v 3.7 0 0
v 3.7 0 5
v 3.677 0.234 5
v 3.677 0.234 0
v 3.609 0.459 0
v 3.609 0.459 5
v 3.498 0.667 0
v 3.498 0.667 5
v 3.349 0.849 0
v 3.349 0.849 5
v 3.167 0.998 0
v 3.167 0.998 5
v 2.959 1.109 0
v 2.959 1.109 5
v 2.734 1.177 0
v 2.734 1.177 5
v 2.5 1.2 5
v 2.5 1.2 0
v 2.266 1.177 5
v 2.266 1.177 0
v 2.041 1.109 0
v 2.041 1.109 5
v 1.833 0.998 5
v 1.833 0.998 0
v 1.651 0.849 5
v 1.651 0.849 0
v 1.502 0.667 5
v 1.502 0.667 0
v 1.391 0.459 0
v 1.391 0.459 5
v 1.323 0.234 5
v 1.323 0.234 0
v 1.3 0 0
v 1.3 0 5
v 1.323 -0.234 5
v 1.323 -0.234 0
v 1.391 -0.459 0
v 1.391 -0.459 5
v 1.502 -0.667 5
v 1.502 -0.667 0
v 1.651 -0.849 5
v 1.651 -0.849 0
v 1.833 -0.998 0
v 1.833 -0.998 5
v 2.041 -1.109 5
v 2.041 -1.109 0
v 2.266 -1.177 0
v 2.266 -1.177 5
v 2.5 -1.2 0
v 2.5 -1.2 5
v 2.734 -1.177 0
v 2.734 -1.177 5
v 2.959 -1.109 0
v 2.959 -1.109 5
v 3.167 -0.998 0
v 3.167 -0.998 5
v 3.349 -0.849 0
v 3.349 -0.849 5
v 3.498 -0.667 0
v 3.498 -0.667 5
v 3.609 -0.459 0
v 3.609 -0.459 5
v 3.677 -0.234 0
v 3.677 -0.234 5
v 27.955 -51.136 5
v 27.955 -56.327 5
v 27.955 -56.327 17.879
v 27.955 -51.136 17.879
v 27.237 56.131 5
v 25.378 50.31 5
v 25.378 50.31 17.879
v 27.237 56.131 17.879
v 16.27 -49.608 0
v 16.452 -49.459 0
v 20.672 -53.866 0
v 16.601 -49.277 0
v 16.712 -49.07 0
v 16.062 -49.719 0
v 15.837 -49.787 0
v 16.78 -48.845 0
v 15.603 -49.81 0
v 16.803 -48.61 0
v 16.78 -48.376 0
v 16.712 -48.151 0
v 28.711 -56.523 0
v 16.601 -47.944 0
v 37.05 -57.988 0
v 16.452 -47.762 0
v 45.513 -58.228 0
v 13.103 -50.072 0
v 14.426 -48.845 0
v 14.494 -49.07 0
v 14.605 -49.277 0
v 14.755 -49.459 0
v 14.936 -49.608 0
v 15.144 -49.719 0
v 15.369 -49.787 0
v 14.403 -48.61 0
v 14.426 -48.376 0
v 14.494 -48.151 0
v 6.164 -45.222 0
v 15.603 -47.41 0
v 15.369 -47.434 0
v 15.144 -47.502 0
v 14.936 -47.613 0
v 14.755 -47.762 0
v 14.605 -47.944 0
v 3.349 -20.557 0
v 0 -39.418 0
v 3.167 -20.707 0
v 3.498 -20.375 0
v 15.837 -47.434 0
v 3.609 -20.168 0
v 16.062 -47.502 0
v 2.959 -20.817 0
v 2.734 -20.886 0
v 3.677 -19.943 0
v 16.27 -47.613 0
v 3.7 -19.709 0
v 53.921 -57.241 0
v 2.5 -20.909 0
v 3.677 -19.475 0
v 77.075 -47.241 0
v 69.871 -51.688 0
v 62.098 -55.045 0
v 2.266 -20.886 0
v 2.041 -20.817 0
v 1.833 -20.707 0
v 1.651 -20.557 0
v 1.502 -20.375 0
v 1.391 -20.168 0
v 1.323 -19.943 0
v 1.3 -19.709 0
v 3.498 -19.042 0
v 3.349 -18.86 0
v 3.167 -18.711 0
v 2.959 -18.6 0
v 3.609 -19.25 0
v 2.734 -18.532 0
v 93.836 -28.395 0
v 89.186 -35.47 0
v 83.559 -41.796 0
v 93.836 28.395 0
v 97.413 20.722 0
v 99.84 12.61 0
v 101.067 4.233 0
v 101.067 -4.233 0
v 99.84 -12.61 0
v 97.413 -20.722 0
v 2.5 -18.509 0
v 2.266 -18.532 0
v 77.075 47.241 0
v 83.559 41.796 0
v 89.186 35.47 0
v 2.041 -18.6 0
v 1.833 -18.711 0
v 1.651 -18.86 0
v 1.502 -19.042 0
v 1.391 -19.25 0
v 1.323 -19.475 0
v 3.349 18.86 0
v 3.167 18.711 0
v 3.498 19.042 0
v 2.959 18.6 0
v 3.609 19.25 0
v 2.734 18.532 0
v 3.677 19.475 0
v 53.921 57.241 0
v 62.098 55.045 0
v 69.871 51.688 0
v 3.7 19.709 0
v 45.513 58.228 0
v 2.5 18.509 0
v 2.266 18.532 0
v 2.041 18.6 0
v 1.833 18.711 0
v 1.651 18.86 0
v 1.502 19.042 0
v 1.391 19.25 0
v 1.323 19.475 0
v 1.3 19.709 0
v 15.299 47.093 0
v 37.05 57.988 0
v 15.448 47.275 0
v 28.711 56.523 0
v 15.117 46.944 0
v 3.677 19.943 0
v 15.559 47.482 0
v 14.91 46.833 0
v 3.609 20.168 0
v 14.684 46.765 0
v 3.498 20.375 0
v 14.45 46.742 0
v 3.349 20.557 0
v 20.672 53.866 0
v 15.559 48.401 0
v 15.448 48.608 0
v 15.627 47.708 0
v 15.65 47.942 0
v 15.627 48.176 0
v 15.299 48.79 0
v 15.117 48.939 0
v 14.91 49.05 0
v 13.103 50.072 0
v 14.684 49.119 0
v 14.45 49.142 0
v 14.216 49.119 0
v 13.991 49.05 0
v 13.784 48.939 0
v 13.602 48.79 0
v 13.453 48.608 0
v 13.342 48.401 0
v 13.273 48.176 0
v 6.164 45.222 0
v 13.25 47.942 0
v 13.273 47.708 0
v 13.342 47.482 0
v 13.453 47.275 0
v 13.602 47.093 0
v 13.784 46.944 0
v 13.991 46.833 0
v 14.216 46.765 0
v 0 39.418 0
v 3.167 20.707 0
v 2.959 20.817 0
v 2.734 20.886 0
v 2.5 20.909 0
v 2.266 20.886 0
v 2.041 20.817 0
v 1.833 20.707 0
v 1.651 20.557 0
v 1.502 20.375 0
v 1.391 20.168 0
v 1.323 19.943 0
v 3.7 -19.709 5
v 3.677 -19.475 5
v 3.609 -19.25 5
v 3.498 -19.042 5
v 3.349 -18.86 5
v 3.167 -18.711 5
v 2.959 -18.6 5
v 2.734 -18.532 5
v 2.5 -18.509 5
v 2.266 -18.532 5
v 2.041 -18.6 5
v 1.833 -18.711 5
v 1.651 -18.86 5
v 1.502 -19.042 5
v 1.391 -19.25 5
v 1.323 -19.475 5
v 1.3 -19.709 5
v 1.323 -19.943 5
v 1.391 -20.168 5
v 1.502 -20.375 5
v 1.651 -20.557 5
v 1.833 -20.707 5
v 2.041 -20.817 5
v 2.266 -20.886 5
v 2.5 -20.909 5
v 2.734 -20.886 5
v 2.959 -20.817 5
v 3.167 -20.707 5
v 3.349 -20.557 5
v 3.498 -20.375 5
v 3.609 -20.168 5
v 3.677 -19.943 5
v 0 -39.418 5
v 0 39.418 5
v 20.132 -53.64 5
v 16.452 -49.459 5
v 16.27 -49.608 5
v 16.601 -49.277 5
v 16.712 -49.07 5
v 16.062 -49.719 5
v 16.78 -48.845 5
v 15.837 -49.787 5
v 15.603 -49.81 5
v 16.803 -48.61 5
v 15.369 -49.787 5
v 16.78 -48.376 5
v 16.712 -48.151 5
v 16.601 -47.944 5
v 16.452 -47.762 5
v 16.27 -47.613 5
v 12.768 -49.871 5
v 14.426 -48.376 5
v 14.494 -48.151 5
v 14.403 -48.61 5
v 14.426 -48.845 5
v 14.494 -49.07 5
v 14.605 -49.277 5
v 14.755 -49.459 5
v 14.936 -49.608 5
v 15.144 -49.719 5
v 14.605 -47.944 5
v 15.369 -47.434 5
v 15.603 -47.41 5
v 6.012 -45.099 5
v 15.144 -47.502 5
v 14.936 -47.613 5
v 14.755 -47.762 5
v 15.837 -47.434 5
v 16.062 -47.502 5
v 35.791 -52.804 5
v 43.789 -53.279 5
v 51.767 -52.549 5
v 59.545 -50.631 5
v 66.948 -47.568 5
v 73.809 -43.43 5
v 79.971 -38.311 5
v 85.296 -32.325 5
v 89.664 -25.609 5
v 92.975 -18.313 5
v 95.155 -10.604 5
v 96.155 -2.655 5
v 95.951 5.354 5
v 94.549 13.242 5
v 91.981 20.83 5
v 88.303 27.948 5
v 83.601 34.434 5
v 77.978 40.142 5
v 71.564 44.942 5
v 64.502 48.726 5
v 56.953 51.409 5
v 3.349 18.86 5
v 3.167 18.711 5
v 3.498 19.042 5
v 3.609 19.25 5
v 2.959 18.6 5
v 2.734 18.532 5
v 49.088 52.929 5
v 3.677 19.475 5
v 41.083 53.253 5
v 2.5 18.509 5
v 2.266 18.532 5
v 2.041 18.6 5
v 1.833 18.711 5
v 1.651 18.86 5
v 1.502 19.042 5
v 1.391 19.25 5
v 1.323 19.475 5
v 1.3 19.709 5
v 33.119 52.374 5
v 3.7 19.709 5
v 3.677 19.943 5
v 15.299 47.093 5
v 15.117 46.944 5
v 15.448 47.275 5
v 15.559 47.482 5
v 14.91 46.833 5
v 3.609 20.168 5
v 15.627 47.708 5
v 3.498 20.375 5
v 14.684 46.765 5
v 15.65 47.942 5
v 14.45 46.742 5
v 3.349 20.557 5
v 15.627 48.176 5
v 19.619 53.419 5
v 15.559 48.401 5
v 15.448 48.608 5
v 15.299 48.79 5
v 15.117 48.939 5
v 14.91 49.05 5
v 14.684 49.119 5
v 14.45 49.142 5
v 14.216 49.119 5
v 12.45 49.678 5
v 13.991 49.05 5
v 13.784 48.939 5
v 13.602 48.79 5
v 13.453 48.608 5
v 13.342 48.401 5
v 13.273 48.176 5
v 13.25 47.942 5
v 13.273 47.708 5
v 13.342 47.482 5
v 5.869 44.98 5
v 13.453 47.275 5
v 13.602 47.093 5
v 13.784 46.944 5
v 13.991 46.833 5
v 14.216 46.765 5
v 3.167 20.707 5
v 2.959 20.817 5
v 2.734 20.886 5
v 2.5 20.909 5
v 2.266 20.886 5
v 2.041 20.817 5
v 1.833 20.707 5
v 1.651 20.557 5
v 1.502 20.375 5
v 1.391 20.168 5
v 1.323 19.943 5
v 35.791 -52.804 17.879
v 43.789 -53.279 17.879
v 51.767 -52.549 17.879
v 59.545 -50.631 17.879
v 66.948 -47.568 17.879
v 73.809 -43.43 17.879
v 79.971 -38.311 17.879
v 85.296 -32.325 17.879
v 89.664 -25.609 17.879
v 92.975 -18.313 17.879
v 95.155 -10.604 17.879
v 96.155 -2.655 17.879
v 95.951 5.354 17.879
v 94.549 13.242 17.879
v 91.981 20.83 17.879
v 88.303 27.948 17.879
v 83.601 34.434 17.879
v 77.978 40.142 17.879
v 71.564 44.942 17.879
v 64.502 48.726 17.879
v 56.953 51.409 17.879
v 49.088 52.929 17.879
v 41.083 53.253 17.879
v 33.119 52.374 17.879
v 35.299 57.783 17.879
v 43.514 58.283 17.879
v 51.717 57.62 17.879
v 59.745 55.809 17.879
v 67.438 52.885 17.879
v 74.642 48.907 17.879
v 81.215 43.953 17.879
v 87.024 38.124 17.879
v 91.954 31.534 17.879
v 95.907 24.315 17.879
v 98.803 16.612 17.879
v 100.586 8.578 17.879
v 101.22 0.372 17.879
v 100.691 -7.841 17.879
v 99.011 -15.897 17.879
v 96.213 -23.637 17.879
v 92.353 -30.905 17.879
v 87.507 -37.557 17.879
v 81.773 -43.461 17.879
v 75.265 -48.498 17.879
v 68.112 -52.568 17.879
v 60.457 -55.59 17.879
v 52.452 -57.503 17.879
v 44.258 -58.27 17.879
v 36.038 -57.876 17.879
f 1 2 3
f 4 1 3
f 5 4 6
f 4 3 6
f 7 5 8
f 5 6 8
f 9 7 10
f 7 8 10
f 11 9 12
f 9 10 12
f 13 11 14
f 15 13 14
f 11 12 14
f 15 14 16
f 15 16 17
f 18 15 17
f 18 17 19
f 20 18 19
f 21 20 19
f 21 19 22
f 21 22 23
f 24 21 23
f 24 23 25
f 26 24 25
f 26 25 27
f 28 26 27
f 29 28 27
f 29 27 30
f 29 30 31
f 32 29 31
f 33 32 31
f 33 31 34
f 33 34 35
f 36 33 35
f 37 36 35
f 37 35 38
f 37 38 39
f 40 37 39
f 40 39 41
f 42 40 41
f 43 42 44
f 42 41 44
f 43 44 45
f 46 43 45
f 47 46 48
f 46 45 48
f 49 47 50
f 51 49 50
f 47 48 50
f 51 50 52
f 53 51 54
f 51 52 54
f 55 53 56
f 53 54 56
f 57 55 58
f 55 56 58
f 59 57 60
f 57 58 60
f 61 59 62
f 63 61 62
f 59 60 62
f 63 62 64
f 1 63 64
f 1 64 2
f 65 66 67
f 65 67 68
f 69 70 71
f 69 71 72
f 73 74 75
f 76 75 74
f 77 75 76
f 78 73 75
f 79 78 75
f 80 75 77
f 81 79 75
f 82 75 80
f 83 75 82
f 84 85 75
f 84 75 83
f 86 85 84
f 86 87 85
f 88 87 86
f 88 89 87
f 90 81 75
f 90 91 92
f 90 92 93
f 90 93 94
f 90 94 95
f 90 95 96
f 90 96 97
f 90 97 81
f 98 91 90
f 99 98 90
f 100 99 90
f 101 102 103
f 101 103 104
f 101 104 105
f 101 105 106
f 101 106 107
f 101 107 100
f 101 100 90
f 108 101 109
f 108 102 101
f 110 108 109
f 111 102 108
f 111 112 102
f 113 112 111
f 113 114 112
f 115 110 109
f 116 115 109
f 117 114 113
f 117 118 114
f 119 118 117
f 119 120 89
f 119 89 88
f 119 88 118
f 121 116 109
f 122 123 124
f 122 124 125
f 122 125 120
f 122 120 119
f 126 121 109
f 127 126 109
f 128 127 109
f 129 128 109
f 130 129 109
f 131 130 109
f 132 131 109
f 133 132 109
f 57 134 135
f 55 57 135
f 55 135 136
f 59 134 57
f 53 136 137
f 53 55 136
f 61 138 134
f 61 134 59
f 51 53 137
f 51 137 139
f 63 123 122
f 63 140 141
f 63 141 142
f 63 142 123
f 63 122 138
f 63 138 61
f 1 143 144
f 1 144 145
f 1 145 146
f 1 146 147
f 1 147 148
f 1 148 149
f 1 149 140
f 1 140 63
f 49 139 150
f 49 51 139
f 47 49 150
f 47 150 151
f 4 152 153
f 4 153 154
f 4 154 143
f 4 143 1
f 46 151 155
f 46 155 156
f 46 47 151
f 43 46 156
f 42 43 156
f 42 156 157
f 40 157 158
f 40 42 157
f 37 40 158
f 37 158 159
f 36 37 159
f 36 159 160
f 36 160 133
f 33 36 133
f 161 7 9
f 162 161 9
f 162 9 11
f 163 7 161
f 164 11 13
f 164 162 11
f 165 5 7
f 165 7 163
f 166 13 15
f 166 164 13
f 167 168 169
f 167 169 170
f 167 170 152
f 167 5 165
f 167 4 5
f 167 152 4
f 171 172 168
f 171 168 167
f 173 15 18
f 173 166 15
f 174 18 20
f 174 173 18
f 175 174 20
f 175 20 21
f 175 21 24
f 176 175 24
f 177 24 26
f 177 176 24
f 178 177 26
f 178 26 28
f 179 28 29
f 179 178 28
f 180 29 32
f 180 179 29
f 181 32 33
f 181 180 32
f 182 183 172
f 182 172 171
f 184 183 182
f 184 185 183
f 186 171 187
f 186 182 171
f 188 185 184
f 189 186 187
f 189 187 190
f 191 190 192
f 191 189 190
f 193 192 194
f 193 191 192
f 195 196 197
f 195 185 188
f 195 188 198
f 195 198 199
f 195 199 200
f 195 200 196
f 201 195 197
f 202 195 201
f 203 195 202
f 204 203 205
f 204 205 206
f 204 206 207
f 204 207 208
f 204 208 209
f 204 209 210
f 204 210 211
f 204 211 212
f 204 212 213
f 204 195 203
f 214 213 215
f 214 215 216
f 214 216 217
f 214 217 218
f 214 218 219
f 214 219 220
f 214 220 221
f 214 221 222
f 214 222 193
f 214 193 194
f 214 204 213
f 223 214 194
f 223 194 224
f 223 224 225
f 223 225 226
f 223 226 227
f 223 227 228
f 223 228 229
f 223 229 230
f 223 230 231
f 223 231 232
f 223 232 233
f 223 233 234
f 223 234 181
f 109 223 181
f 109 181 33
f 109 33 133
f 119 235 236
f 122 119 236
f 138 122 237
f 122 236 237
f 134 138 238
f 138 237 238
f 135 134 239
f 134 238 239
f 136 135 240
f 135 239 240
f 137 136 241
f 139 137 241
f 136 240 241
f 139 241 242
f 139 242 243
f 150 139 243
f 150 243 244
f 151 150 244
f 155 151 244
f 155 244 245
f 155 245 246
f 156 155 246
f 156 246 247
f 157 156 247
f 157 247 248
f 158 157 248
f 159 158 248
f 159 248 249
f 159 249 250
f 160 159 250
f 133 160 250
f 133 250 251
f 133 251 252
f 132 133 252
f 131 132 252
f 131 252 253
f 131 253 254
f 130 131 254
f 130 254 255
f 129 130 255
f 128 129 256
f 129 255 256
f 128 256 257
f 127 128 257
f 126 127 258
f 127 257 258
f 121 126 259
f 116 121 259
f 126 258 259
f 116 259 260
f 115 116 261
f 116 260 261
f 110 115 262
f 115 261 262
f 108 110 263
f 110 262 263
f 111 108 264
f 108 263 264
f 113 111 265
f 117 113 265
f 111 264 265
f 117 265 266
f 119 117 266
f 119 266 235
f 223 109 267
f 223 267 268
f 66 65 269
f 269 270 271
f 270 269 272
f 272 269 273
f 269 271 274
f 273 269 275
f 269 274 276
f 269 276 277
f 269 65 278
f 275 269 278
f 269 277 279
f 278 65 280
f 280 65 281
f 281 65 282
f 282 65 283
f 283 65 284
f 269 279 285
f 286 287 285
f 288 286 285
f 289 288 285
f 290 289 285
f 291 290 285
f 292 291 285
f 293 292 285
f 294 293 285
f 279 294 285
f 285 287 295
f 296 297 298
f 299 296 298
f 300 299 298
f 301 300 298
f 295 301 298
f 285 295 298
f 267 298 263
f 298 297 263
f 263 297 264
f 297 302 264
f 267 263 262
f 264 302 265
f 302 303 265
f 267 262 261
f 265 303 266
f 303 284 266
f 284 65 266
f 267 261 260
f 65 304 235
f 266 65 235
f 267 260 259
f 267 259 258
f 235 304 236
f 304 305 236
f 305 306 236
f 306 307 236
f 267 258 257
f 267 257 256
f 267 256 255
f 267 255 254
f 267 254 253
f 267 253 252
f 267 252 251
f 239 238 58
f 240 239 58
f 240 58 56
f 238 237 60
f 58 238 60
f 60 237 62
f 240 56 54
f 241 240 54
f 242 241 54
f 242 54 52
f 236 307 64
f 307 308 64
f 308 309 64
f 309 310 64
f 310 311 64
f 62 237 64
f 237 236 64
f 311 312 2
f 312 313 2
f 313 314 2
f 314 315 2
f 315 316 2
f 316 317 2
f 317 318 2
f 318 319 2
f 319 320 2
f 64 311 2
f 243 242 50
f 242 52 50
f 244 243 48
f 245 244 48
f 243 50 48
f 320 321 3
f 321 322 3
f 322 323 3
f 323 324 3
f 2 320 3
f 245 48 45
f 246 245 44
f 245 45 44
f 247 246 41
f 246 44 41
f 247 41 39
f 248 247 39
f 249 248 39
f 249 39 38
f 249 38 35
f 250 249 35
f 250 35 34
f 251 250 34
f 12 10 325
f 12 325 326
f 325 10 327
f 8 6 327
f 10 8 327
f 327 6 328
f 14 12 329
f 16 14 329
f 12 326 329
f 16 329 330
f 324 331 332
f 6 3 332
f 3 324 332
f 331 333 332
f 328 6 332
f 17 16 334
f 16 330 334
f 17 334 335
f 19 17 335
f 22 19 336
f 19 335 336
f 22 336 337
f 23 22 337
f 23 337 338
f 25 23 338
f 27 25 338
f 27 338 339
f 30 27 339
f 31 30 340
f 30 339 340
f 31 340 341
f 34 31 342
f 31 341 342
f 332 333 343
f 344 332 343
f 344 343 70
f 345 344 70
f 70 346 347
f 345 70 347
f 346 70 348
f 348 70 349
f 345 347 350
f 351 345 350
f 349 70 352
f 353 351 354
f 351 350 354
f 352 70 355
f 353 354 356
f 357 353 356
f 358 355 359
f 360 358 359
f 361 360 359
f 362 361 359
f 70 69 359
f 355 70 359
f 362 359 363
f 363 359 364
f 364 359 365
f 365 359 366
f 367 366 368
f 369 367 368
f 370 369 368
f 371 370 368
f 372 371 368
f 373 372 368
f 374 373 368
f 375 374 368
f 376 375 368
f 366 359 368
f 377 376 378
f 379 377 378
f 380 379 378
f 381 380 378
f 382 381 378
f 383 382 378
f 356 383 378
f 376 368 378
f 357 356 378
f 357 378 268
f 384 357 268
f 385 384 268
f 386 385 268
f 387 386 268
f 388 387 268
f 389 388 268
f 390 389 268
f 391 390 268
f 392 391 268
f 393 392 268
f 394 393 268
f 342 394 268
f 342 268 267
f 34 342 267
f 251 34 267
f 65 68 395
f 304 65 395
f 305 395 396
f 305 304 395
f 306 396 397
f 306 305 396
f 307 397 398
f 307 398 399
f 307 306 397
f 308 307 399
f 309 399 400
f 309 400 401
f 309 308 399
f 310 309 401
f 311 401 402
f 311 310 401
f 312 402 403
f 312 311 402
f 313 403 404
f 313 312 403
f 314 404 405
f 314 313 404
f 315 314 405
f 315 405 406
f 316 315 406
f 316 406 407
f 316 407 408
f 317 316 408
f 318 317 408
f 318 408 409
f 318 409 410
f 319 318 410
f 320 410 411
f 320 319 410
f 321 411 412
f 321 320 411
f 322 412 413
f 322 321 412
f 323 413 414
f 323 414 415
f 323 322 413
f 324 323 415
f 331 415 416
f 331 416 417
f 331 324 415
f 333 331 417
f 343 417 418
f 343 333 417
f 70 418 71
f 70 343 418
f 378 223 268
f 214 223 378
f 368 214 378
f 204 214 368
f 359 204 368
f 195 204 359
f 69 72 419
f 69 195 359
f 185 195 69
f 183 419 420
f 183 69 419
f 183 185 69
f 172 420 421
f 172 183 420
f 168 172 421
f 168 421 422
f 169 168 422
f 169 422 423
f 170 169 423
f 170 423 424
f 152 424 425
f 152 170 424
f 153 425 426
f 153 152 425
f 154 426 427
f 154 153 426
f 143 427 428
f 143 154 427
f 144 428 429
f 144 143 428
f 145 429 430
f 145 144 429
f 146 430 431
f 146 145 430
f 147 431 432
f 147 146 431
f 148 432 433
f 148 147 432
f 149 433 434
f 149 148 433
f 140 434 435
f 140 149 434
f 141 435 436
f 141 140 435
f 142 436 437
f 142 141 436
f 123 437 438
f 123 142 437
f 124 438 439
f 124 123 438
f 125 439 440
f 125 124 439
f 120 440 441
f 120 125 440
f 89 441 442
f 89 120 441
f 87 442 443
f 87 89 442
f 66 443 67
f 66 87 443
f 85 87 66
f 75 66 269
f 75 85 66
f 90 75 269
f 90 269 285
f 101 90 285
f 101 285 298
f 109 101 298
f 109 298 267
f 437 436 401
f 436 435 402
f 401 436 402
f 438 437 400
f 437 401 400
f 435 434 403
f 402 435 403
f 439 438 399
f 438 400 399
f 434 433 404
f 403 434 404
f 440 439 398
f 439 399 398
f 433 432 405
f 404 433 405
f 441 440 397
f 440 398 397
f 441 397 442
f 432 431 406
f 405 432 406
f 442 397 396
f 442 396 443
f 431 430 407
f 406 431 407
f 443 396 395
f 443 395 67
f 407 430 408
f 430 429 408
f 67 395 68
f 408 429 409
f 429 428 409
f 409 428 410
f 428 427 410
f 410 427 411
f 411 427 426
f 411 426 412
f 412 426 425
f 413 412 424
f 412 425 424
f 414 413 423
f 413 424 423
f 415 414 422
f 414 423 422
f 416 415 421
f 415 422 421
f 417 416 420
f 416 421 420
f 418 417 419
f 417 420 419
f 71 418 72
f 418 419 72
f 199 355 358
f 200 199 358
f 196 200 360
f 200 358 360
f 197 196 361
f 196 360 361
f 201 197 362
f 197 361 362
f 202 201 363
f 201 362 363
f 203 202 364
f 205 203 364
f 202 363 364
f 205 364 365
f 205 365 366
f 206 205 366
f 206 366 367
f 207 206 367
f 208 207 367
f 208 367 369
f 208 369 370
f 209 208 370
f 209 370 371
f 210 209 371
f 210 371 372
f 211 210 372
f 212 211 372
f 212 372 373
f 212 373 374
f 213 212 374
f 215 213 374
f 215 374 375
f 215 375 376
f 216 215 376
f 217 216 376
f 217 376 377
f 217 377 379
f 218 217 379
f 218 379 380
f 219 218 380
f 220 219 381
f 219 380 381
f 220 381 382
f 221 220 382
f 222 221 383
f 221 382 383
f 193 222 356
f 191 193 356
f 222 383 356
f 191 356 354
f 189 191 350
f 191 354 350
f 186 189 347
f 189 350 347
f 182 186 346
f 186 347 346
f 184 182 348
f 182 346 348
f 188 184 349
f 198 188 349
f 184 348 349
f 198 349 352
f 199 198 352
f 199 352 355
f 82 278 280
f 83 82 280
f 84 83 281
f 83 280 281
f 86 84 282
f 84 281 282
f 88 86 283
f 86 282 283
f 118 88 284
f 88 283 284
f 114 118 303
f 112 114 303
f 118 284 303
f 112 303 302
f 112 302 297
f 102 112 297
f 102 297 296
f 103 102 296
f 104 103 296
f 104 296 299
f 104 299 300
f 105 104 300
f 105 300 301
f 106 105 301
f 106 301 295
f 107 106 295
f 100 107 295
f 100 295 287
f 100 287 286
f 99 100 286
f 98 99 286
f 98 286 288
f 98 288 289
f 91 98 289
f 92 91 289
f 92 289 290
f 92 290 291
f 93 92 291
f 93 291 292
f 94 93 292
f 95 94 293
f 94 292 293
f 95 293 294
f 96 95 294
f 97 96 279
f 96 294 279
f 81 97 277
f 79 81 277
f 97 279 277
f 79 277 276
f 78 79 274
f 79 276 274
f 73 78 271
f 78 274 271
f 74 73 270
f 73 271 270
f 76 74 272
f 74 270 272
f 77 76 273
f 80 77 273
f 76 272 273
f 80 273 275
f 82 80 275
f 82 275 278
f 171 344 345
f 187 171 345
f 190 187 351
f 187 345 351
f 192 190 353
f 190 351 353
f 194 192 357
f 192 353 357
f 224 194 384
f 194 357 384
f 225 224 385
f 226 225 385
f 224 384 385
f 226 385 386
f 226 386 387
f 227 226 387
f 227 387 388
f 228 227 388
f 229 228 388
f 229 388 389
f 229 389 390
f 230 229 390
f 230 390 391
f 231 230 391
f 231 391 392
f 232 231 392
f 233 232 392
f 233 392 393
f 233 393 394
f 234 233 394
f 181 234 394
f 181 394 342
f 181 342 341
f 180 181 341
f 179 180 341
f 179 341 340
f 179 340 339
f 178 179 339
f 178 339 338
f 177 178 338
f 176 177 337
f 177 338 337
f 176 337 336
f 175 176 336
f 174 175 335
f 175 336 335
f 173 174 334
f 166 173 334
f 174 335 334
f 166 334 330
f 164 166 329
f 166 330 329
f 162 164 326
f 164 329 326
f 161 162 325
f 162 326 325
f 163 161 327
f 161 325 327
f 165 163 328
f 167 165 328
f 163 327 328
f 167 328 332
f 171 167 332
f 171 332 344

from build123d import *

# Parameters (mm, degrees)
BOSS_EXTRUDE1_DEPTH = 5
SKETCH2_R           = 1.2
CUT_EXTRUDE1_DEPTH  = 117.909745524
BOSS_EXTRUDE2_DEPTH = 12.879


with BuildPart() as part:
    # Sketch1 → Boss-Extrude1 (new body)
    with BuildSketch(Plane.XY):
        with BuildLine():
            Line((0, -39.4175), (0, 39.4175))
            ThreePointArc((0, 39.4175), (101.221, 0), (0, -39.4175))
        make_face()
    extrude(amount=BOSS_EXTRUDE1_DEPTH)

    # Sketch2 → Cut-Extrude1 (cut, through all)
    with BuildSketch(Plane.XY.offset(5)):
        with Locations((2.5, 19.70875)):
            Circle(SKETCH2_R)
        with Locations((2.5, 0)):
            Circle(SKETCH2_R)
        with Locations((2.5, -19.70875)):
            Circle(SKETCH2_R)
        with Locations((14.450382973, 47.941684776)):
            Circle(SKETCH2_R)
        with Locations((15.603067001, -48.610455862)):
            Circle(SKETCH2_R)
    extrude(amount=-CUT_EXTRUDE1_DEPTH, mode=Mode.SUBTRACT)

    # Sketch3 → Boss-Extrude2 (add)
    with BuildSketch(Plane.XY.offset(5)):
        with BuildLine():
            Line((27.955, -56.327452693), (27.955, -51.136357684))
            ThreePointArc((27.955, -51.136357684), (96.203818326, 1.353060418), (25.378179175, 50.30986847))
            Line((25.378179175, 50.30986847), (27.236614528, 56.131473172))
            ThreePointArc((27.236614528, 56.131473172), (101.219810829, 0.372318969), (27.955, -56.327452693))
        make_face()
    extrude(amount=BOSS_EXTRUDE2_DEPTH)


solid = part.part
